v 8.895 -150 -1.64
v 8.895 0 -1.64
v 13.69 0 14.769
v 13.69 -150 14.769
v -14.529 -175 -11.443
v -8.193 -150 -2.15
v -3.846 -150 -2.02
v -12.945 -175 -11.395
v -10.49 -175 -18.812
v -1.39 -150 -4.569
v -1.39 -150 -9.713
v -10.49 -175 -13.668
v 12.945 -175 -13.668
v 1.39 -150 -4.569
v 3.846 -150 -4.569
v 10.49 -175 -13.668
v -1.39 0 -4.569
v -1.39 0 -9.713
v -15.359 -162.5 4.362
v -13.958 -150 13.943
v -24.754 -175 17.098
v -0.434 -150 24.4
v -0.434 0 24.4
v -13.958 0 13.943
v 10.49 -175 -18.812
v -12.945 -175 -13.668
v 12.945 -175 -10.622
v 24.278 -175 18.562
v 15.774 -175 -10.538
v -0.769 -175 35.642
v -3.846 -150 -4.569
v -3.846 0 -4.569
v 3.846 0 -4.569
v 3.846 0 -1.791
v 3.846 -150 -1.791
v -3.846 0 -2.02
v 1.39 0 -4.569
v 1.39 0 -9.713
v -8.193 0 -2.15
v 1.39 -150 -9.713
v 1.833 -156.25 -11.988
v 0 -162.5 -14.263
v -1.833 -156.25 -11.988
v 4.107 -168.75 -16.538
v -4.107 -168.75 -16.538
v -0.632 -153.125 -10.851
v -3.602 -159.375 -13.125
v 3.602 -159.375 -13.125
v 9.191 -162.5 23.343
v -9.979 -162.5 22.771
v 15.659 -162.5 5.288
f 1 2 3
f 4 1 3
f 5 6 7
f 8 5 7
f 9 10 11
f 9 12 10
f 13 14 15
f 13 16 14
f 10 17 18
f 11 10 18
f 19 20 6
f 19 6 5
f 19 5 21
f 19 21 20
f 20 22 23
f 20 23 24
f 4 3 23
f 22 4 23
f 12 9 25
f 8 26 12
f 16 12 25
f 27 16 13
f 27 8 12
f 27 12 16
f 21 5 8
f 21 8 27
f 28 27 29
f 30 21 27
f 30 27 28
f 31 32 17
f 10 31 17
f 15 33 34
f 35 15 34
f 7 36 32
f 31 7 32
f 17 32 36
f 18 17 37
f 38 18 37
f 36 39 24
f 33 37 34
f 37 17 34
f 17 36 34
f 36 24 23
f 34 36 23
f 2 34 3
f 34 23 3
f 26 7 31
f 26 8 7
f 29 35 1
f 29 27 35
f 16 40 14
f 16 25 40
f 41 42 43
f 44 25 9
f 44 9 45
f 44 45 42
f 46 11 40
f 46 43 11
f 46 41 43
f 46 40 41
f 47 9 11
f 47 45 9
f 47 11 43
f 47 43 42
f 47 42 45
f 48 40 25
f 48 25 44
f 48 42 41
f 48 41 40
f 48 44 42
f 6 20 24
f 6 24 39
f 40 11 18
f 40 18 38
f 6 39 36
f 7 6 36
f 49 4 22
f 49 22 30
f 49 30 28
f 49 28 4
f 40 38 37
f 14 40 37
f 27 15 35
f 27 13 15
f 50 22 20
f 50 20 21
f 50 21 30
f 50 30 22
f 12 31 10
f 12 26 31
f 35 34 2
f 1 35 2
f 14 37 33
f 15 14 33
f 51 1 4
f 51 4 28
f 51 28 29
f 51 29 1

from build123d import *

# Parameters (mm, degrees)
F1_DEPTH = 150
F2_DEPTH = 25
F2_TAPER = -20


with BuildPart() as f1:
    # F0 (on Front) → F1 (new body)
    with BuildSketch(Plane.XZ):
        Polygon((-0.4338717465, 24.399797494), (-13.9581263065, 13.9433988455), (-8.1927247302, -2.1501364642), (-3.8462013472, -2.020396331), (3.8462013472, -1.7907844638), (8.8947439628, -1.6400896363), (13.6899788204, 14.7686719489), align=None)
        Polygon((3.8462013472, -1.7907844638), (-3.8462013472, -2.020396331), (-3.8462013472, -4.5691458424), (-1.3902849751, -4.5691458424), (-1.3902849751, -9.7131561403), (0, -9.7131561403), (1.3902849751, -9.7131561403), (1.3902849751, -4.5691458424), (3.8462013472, -4.5691458424), align=None)
    extrude(amount=F1_DEPTH)

    # F1_face (on face) → F2 (join)
    with BuildSketch(Plane(origin=(0.0021061426, -150, 8.9125586463), x_dir=(1, 0, 0), z_dir=(0, -1, 0))):
        Polygon((-8.1948308728, -11.0626951105), (-3.8483074898, -10.9329549773), (-3.8483074898, -13.4817044887), (-1.3923911176, -13.4817044887), (-1.3923911176, -18.6257147866), (1.3881788325, -18.6257147866), (1.3881788325, -13.4817044887), (3.8440952046, -13.4817044887), (3.8440952046, -10.7033431101), (8.8926378202, -10.5526482826), (13.6878726779, 5.8561133027), (-0.4359778891, 15.4872388477), (-13.9602324491, 5.0308401992), align=None)
    extrude(amount=F2_DEPTH, taper=F2_TAPER)


solid = f1.part
